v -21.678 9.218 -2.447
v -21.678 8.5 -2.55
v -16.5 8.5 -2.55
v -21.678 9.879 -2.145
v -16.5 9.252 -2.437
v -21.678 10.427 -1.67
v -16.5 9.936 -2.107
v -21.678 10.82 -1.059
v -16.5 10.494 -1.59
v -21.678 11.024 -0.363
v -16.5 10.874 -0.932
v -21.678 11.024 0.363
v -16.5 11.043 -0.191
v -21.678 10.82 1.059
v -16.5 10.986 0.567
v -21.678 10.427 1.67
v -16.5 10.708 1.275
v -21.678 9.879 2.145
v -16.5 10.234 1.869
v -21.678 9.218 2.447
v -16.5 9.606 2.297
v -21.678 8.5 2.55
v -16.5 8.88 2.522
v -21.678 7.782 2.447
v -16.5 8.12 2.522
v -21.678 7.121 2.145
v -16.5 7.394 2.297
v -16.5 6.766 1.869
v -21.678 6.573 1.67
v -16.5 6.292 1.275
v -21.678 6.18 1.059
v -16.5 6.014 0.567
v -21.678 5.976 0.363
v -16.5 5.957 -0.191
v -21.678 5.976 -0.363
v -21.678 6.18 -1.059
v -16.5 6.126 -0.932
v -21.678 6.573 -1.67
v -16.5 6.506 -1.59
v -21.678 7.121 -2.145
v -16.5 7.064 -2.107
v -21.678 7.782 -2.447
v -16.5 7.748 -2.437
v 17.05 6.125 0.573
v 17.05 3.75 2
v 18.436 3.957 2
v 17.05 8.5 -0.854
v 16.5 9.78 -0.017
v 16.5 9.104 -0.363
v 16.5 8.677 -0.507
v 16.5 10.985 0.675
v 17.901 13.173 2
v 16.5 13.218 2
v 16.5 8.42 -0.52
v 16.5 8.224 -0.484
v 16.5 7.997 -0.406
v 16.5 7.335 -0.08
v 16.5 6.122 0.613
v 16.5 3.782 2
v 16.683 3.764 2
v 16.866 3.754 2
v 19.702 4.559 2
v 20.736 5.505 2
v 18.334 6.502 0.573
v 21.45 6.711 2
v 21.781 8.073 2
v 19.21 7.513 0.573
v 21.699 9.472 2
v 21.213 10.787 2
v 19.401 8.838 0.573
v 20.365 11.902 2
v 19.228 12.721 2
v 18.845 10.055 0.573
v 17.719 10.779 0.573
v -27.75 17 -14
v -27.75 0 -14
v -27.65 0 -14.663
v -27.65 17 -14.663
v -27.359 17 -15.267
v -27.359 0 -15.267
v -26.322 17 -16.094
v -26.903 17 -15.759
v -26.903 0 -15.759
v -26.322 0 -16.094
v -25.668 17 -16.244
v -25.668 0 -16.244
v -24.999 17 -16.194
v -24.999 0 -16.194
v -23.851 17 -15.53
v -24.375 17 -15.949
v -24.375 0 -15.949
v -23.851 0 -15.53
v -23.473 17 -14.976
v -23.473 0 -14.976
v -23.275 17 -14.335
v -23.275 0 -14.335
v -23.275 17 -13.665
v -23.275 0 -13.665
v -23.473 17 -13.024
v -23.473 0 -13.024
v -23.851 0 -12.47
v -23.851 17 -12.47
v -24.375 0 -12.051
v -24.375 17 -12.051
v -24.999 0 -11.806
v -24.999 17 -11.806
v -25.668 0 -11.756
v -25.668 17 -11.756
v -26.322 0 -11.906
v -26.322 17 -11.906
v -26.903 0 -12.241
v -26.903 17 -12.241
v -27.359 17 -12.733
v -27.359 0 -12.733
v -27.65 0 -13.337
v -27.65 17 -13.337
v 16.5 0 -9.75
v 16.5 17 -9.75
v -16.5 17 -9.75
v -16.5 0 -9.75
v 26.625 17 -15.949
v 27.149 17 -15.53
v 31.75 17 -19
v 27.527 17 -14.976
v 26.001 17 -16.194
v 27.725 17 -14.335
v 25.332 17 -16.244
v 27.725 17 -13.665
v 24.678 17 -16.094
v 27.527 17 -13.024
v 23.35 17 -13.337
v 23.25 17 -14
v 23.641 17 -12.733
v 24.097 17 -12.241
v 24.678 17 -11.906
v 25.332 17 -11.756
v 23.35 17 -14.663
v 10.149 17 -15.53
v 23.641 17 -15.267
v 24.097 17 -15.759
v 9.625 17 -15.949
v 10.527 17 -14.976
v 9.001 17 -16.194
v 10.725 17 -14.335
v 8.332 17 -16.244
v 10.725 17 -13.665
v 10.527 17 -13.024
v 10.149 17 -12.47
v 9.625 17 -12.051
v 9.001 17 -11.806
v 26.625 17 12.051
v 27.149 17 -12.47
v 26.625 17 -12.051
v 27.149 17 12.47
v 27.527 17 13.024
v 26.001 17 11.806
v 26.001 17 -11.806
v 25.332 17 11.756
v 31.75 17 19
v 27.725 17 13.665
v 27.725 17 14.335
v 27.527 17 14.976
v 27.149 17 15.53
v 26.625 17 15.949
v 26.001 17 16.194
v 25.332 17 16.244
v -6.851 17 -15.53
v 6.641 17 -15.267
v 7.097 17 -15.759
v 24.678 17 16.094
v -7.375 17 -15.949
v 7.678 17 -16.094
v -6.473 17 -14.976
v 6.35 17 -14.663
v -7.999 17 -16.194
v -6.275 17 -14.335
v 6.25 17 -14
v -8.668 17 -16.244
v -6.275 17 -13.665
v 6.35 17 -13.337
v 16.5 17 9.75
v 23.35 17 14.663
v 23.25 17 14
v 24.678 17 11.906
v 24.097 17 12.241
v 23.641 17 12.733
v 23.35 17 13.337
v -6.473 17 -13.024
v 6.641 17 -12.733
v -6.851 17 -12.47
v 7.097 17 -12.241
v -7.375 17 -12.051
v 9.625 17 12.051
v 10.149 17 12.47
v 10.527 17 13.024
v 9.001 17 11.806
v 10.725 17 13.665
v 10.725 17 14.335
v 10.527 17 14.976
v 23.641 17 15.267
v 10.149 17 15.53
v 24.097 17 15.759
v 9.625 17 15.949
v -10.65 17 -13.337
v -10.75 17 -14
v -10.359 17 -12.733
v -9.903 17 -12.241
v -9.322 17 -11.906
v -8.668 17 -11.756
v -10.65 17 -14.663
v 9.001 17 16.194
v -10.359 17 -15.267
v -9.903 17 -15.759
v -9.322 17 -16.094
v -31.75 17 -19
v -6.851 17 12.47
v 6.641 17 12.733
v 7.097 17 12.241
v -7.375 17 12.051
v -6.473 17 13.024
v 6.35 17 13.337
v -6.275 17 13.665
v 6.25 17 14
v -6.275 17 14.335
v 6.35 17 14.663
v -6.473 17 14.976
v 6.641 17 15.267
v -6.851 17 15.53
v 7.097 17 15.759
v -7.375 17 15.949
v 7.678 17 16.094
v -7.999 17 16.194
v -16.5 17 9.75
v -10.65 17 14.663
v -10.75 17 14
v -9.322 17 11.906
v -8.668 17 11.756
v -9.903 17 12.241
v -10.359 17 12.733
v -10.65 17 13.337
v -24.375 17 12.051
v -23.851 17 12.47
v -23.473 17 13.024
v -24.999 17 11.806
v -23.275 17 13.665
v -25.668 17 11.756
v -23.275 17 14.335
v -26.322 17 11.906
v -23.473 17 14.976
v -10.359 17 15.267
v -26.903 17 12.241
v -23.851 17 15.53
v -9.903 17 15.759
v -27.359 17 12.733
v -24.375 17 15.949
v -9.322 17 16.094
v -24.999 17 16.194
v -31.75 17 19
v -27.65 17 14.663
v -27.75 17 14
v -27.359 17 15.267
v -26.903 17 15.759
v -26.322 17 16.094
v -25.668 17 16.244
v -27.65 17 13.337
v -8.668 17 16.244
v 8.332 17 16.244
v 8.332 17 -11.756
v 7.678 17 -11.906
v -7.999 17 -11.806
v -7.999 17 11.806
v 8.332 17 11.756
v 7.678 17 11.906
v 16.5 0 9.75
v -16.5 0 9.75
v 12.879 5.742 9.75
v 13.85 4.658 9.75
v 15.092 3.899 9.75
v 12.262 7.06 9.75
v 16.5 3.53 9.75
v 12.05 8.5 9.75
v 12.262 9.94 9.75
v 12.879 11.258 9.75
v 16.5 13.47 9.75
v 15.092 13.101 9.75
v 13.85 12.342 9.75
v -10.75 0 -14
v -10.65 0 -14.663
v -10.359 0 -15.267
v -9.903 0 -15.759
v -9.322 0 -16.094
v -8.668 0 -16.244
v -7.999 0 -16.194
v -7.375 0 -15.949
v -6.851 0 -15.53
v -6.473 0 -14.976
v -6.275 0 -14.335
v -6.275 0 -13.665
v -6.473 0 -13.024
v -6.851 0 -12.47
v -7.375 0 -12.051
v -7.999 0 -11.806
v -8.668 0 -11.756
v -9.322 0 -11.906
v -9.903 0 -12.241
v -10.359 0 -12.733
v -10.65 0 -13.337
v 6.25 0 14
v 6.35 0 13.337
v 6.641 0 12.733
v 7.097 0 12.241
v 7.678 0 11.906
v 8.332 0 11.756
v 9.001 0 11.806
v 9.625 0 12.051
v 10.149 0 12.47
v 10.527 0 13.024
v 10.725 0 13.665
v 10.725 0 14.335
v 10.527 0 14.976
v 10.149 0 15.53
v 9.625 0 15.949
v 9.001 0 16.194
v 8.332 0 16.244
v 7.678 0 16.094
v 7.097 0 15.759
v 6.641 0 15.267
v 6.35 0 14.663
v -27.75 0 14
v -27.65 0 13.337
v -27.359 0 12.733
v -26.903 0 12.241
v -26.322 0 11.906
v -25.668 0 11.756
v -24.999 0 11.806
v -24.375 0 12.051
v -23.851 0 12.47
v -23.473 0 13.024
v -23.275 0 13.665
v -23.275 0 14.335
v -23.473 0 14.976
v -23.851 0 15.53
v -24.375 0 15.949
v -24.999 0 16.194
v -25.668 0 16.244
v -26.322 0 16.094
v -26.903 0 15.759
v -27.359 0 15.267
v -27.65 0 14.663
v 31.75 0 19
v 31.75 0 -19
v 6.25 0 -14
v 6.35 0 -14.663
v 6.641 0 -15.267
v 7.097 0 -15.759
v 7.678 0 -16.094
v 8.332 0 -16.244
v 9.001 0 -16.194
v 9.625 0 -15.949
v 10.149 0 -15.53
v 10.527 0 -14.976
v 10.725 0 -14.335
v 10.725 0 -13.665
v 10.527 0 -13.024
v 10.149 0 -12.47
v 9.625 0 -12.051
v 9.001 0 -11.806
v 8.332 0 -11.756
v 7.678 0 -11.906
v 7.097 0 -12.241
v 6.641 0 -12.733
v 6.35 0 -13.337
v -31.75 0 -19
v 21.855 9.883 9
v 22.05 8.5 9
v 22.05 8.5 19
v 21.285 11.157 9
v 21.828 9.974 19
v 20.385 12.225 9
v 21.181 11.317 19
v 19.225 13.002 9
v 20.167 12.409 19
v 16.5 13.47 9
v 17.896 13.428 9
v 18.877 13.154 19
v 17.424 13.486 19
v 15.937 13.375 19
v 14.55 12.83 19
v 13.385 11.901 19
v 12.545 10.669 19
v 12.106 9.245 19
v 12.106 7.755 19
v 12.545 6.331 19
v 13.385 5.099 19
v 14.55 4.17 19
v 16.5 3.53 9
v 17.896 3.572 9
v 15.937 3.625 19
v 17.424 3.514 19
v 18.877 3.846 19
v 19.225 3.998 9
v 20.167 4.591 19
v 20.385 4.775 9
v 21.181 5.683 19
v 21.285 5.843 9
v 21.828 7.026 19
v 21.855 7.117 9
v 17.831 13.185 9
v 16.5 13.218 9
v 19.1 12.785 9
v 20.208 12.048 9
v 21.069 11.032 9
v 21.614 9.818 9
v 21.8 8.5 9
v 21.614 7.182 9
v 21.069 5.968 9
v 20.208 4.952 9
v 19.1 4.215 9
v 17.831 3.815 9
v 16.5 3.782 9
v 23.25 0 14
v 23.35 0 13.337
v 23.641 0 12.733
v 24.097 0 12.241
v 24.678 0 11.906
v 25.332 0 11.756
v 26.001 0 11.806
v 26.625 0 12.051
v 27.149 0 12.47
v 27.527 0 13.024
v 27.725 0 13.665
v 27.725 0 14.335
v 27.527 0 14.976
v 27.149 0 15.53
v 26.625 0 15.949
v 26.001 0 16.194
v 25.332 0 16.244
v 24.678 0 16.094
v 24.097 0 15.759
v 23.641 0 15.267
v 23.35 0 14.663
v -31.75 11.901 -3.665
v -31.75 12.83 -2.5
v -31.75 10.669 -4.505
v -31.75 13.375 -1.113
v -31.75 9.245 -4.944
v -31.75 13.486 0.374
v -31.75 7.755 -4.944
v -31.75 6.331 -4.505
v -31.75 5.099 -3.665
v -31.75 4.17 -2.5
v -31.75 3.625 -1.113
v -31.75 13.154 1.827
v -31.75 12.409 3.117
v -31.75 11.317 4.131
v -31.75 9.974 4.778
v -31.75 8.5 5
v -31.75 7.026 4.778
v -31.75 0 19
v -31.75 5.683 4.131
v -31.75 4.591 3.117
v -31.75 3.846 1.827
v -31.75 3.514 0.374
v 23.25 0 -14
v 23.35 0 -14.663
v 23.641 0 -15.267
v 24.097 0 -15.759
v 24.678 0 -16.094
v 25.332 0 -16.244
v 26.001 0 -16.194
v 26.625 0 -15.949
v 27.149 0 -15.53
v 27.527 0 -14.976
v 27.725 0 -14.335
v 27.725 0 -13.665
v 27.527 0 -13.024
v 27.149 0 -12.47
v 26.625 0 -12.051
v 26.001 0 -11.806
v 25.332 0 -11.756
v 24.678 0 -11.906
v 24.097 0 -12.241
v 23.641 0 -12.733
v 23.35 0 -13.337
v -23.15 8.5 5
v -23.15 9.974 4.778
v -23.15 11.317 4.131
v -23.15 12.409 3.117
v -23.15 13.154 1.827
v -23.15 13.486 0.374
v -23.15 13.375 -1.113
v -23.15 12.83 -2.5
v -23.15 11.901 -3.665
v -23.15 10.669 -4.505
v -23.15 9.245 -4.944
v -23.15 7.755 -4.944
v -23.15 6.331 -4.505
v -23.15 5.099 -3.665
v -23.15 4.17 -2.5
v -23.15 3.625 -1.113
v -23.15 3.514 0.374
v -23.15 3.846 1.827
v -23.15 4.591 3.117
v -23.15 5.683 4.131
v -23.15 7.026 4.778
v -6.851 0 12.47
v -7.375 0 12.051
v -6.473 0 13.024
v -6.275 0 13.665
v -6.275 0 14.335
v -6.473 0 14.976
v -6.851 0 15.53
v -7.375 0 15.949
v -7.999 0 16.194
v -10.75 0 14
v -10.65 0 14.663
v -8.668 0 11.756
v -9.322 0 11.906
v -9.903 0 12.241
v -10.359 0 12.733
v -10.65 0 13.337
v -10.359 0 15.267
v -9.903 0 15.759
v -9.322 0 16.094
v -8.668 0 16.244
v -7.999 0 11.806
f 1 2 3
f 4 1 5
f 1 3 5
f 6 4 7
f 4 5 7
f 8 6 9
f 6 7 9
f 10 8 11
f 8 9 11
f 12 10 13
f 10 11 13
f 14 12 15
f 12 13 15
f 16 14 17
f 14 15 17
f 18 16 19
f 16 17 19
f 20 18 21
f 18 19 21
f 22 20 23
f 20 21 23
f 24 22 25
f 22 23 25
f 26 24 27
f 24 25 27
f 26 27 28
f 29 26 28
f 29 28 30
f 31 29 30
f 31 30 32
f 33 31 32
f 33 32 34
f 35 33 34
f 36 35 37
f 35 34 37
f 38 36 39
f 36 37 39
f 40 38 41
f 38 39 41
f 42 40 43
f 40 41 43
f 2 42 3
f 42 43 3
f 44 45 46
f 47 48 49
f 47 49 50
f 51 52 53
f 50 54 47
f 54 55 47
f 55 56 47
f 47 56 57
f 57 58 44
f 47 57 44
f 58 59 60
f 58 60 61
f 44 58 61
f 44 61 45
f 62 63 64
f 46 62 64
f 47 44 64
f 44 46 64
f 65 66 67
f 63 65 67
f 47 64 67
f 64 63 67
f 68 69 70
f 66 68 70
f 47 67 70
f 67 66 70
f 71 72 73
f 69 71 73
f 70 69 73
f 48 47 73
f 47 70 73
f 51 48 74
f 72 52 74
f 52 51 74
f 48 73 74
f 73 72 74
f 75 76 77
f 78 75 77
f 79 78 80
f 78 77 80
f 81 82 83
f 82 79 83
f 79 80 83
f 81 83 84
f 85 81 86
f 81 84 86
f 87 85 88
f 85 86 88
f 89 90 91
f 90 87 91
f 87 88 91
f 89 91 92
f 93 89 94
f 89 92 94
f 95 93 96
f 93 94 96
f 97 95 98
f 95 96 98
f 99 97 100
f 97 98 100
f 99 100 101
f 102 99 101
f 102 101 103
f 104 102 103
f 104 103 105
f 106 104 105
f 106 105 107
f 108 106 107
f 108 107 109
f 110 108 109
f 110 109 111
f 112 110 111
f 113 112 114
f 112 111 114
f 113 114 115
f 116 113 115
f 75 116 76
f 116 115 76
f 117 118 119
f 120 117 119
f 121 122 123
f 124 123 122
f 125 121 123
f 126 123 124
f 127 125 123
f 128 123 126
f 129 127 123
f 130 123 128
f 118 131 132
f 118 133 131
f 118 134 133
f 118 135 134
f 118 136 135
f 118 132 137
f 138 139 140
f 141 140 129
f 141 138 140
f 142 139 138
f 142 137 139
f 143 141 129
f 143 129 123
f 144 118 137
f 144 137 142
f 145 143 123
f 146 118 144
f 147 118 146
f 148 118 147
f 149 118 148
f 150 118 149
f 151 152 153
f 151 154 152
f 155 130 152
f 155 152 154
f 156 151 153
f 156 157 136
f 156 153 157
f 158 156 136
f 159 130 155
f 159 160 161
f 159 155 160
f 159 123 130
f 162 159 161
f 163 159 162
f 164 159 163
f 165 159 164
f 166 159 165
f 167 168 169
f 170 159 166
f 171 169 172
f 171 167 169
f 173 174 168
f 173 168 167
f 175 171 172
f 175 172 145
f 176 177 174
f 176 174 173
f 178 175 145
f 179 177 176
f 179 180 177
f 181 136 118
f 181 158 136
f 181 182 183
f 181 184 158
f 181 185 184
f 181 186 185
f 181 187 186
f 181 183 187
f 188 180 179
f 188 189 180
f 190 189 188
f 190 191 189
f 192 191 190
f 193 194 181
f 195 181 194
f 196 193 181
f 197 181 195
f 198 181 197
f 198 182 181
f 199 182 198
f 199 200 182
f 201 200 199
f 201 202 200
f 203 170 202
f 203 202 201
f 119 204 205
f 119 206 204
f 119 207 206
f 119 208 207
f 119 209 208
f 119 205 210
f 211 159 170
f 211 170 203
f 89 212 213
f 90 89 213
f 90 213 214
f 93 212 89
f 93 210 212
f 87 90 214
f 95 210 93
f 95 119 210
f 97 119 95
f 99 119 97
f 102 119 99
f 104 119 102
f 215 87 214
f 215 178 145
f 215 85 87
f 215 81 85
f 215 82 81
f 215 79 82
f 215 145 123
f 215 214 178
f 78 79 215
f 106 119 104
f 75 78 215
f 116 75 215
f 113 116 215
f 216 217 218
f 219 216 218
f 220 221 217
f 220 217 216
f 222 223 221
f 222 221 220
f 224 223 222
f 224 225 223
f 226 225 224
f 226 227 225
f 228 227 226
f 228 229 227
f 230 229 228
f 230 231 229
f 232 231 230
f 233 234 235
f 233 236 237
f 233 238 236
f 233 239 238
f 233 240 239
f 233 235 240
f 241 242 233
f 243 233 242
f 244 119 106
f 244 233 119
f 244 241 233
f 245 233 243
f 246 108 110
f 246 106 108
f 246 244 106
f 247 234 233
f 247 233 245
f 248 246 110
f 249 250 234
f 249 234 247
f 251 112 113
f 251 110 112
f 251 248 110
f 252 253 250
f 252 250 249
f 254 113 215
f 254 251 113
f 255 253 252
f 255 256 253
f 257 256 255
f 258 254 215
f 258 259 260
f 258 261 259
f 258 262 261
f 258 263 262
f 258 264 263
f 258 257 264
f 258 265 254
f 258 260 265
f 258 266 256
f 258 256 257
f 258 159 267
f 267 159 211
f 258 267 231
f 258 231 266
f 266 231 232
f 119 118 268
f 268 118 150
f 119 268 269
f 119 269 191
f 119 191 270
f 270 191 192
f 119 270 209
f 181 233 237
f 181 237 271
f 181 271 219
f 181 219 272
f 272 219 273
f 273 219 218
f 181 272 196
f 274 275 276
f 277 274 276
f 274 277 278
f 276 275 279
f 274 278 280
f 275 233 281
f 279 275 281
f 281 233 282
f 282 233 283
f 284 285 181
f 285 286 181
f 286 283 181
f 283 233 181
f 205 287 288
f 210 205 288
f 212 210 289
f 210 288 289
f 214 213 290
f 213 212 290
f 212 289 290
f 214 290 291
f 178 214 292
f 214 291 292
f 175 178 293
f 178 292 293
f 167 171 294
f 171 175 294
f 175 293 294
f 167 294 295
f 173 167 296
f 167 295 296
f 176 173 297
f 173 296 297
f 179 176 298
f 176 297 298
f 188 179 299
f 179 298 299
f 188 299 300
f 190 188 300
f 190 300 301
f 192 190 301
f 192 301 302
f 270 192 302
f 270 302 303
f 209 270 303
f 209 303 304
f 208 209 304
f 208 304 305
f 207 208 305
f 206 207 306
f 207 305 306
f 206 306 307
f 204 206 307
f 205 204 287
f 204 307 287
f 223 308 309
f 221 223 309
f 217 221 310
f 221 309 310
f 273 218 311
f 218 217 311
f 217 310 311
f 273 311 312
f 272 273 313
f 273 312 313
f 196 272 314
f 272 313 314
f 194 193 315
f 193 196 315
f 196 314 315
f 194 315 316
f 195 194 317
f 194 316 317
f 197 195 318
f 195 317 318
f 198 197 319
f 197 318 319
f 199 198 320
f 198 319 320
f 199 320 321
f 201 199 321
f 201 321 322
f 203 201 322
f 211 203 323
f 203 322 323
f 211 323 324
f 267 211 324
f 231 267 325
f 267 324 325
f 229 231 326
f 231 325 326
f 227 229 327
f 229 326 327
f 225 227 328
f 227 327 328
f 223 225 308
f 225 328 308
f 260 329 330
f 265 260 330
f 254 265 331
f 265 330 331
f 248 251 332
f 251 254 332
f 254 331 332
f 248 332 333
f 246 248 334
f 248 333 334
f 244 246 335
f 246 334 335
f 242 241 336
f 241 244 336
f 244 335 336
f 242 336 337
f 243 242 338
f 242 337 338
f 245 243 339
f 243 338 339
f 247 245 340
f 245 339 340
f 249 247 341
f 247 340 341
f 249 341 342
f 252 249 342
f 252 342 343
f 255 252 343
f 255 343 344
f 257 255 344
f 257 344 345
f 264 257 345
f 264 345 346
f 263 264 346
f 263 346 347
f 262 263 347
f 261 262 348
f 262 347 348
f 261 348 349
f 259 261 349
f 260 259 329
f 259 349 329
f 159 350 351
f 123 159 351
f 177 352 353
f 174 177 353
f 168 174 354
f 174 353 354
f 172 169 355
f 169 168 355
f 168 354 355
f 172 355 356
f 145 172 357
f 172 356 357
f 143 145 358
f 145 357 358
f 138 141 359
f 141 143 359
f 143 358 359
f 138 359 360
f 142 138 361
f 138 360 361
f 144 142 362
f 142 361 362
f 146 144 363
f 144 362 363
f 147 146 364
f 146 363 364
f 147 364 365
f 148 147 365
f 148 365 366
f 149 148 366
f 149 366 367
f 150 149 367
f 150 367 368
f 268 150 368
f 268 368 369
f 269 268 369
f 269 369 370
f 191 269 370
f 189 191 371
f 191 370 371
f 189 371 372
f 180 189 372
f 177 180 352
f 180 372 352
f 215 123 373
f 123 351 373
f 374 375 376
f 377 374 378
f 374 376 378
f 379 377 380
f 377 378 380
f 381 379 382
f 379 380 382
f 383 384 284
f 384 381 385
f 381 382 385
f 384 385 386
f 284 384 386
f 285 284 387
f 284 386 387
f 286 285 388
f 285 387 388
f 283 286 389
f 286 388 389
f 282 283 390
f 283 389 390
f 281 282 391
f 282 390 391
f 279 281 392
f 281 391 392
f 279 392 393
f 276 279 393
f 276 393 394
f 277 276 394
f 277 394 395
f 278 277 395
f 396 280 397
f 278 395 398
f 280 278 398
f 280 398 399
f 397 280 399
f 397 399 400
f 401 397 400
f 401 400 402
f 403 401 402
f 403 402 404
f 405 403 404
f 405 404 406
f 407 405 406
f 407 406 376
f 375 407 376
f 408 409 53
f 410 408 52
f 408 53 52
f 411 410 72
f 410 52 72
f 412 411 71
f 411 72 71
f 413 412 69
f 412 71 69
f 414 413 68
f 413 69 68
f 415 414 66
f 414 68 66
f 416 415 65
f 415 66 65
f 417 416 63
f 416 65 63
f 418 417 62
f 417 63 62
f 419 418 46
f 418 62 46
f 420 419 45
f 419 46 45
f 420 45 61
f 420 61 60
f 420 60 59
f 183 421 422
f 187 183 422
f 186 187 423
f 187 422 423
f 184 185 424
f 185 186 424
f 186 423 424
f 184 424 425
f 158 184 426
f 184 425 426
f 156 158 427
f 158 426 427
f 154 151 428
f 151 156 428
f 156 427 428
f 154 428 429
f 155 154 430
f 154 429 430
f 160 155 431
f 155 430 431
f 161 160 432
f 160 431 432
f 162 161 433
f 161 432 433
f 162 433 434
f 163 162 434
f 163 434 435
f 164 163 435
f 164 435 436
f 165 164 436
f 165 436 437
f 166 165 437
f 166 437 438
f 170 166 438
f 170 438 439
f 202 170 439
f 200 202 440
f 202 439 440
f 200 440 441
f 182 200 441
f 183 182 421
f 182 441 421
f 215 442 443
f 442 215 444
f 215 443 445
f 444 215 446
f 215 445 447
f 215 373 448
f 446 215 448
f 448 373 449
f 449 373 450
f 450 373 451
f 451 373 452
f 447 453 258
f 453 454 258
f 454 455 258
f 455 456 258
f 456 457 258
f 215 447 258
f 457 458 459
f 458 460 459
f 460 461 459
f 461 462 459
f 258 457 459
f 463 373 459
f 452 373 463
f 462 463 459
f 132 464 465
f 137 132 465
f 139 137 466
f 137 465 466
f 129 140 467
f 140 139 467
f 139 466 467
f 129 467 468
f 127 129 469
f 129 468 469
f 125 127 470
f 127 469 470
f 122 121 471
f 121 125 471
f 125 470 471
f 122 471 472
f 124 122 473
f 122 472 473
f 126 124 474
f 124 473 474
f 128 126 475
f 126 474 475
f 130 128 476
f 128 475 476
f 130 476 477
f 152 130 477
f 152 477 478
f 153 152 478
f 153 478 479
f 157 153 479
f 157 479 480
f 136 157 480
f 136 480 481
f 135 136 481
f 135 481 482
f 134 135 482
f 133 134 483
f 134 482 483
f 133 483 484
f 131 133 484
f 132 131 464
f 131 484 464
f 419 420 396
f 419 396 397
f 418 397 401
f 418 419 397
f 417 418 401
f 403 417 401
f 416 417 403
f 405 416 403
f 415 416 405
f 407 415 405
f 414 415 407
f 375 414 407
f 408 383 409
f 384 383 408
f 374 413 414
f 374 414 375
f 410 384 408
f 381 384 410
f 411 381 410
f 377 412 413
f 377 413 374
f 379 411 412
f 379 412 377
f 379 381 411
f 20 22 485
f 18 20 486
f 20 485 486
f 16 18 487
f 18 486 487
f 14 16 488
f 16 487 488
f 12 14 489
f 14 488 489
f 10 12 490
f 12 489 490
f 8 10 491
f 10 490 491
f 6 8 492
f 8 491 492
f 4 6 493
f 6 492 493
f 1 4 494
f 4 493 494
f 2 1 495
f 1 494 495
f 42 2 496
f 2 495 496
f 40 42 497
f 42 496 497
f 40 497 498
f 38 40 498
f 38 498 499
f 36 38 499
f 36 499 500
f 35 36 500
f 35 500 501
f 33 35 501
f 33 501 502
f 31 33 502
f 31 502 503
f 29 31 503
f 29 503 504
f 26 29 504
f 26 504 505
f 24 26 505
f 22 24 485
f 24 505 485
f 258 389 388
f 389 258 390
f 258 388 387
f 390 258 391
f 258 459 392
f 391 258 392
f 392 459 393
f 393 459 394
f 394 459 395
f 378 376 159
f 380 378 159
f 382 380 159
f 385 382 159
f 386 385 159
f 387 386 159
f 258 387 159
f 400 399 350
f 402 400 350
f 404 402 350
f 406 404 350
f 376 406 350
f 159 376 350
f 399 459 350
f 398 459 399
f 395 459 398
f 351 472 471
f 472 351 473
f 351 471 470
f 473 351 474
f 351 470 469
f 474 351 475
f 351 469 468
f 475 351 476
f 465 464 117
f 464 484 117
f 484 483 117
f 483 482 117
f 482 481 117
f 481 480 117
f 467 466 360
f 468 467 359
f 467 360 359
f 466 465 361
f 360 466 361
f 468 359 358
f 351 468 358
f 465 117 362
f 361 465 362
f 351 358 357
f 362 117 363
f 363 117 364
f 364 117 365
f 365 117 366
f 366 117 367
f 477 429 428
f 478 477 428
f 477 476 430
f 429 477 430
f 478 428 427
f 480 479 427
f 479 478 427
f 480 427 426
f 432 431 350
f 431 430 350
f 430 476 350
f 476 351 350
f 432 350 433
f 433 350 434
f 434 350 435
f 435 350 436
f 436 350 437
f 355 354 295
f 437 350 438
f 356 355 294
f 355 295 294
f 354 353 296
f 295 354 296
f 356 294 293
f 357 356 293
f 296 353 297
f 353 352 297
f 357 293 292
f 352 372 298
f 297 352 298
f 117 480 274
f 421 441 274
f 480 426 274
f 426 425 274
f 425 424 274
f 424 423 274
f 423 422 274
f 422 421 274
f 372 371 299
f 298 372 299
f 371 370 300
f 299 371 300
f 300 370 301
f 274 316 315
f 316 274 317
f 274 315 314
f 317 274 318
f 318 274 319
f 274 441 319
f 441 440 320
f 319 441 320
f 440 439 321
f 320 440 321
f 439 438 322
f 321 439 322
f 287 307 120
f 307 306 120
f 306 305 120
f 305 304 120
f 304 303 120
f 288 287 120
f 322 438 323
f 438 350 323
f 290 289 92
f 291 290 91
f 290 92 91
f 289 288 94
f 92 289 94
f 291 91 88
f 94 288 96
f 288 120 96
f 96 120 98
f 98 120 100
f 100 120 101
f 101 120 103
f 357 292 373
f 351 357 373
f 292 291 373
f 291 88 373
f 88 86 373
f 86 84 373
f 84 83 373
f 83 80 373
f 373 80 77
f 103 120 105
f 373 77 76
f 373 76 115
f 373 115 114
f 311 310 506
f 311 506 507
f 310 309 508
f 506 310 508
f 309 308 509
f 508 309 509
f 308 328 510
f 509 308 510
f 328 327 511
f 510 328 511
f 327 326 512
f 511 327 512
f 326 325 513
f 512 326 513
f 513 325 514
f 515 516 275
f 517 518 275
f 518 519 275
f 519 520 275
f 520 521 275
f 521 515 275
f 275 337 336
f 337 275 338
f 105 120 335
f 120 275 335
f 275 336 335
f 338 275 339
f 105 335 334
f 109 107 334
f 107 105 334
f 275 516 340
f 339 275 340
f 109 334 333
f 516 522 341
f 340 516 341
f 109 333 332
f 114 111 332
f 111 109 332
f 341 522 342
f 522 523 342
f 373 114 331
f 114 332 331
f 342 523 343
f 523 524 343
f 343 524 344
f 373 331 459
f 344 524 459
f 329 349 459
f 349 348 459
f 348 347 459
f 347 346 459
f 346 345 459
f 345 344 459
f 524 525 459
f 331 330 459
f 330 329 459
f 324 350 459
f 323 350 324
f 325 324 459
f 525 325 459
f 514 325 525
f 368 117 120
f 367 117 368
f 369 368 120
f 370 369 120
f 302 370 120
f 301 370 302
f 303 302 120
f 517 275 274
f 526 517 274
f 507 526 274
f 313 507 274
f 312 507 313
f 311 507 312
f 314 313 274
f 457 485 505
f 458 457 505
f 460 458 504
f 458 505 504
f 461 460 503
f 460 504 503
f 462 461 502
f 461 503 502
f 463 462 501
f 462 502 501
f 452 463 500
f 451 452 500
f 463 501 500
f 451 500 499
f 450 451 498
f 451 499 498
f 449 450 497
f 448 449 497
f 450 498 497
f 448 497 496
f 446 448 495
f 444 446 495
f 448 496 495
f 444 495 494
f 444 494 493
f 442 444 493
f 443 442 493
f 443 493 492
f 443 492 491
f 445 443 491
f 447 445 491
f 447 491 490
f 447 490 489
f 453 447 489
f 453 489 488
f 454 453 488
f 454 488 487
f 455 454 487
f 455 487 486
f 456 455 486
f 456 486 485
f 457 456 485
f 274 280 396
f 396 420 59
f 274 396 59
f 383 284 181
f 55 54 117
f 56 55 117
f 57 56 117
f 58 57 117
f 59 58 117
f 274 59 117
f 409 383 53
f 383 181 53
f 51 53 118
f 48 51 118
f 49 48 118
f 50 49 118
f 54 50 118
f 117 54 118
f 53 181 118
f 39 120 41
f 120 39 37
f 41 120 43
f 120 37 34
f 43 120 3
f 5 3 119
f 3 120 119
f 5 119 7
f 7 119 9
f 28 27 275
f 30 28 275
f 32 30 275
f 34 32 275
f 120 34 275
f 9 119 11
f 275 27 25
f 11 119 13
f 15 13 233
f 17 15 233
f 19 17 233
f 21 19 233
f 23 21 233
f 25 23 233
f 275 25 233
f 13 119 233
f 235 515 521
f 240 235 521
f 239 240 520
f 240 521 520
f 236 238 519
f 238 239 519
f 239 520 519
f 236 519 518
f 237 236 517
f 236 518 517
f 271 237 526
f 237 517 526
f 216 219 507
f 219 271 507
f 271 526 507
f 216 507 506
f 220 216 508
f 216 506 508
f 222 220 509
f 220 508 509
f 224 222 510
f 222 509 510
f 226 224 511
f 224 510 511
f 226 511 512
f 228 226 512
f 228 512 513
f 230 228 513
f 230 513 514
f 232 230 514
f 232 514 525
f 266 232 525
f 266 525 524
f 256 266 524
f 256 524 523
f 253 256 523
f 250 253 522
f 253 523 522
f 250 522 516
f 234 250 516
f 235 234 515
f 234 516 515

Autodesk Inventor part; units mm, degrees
ref_plane "YZ Plane" through (0, 0, 0) normal (1, 0, 0) x (0, 1, 0)
ref_plane "XZ Plane" through (0, 0, 0) normal (0, 1, 0) x (-1, 0, 0)
ref_plane "XY Plane" through (0, 0, 0) normal (0, 0, 1) x (1, 0, 0)
sketch "Sketch1" plane through (0, 0, 0) normal (0, 1, 0) x (-1, 0, 0)
  line L0 (31.75, 19) -> (-31.75, 19)
  line L1 (-31.75, 19) -> (-31.75, -19)
  line L2 (-31.75, -19) -> (31.75, -19)
  line L3 (31.75, -19) -> (31.75, 19)
  line L4 (31.75, 19) -> (31.75, 14) construction
  line L5 (31.75, 14) -> (31.75, -14) construction
  line L6 (31.75, 19) -> (25.5, 19) construction
  line L7 (25.5, 19) -> (8.5, 19) construction
  line L8 (8.5, 19) -> (-8.5, 19) construction
  line L9 (-8.5, 19) -> (-25.5, 19) construction
  line L10 (31.75, 14) -> (-25.5, 14) construction
  line L11 (-25.5, 14) -> (-25.5, -14) construction
  line L12 (-25.5, -14) -> (-8.5, -14) construction
  line L13 (-8.5, -14) -> (8.5, -14) construction
  line L14 (8.5, -14) -> (25.5, -14) construction
  line L15 (25.5, -14) -> (31.75, -14) construction
  line L16 (25.5, 14) -> (25.5, -14) construction
  line L17 (8.5, 14) -> (8.5, -14) construction
  line L18 (-8.5, 14) -> (-8.5, -14) construction
  circle A0 centre (25.5, 14) radius 2.25
  circle A1 centre (25.5, -14) radius 2.25
  circle A2 centre (8.5, -14) radius 2.25
  circle A3 centre (-8.5, -14) radius 2.25
  circle A4 centre (-25.5, -14) radius 2.25
  circle A5 centre (-25.5, 14) radius 2.25
  circle A6 centre (-8.5, 14) radius 2.25
  circle A7 centre (8.5, 14) radius 2.25
  point P0 (0, 0)
  dimension "d0" = 63.5
  dimension "d1" = 38
  dimension "d5" = 17
  dimension "d6" = 17
  dimension "d7" = 17
extrude "Extrusion1" add sketch "Sketch1" along normal blind 17
sketch "Sketch2" plane through (0, 17, 0) normal (0, 1, 0) x (1, 0, 0)
  line L0 (-16.5, -9.75) -> (16.5, -9.75)
  line L1 (16.5, -9.75) -> (16.5, 9.75)
  line L2 (16.5, 9.75) -> (-16.5, 9.75)
  line L3 (-16.5, 9.75) -> (-16.5, -9.75)
  line L4 (-16.5, -9.75) -> (16.5, 9.75) construction
  line L5 (16.5, -9.75) -> (-16.5, 9.75) construction
  point P0 (0, 0)
  dimension "d12" = 33
  dimension "d13" = 19.5
extrude "Extrusion2" cut sketch "Sketch2" against normal through all
sketch "Sketch3" plane through (-31.75, 0, -19) normal (-1, 0, 0) x (0, 0, 1)
  line L0 (19, 0) -> (19, 17) construction
  line L1 (38, 17) -> (0, 17) construction
  line L2 (0, 0) -> (0, 17) construction
  line L3 (0, 8.5) -> (38, 8.5) construction
  line L4 (38, 0) -> (38, 17) construction
  circle A0 centre (19, 8.5) radius 2.08 construction
hole "Hole1" at (-31.75, 8.5, 0) direction (1, 0, 0) diameter 10 depth 8.6 tip angle 118
sketch "Sketch4" plane through (-16.5, 17, 9.75) normal (1, 0, 0) x (0, 0, -1)
  line L0 (-9.25, -17) -> (-9.25, 0) construction
  line L1 (-9.25, -8.5) -> (28.75, -8.5) construction
  line L2 (28.75, -17) -> (28.75, 0) construction
  circle A0 centre (9.75, -8.5) radius 2.55
  point P0 (9.75, -17)
  dimension "d23" = 5.1
extrude "Extrusion3" cut sketch "Sketch4" against normal through all
sketch "Sketch5" plane through (-31.75, 0, 19) normal (0, 0, 1) x (1, 0, 0)
  line L0 (63.5, 0) -> (63.5, 17) construction
  line L1 (63.5, 8.5) -> (48.8, 8.5) construction
  circle A0 centre (48.8, 8.5) radius 5
  point P0 (31.75, 0)
  dimension "d26" = 14.7
  dimension "d27" = 10
extrude "Extrusion4" cut sketch "Sketch5" against normal blind 10
sketch "Sketch6" plane through (-31.75, 0, 19) normal (0, 0, 1) x (1, 0, 0)
  line L0 (63.5, 0) -> (63.5, 17) construction
  line L1 (63.5, 8.5) -> (48.8, 8.5) construction
  point P0 (31.75, 0)
  dimension "d30" = 14.7
hole "Hole2" at (17.05, 8.5, 19) direction (0, 0, -1) diameter 9.5 depth 17 tip angle 118
properties part number "Distributore"
